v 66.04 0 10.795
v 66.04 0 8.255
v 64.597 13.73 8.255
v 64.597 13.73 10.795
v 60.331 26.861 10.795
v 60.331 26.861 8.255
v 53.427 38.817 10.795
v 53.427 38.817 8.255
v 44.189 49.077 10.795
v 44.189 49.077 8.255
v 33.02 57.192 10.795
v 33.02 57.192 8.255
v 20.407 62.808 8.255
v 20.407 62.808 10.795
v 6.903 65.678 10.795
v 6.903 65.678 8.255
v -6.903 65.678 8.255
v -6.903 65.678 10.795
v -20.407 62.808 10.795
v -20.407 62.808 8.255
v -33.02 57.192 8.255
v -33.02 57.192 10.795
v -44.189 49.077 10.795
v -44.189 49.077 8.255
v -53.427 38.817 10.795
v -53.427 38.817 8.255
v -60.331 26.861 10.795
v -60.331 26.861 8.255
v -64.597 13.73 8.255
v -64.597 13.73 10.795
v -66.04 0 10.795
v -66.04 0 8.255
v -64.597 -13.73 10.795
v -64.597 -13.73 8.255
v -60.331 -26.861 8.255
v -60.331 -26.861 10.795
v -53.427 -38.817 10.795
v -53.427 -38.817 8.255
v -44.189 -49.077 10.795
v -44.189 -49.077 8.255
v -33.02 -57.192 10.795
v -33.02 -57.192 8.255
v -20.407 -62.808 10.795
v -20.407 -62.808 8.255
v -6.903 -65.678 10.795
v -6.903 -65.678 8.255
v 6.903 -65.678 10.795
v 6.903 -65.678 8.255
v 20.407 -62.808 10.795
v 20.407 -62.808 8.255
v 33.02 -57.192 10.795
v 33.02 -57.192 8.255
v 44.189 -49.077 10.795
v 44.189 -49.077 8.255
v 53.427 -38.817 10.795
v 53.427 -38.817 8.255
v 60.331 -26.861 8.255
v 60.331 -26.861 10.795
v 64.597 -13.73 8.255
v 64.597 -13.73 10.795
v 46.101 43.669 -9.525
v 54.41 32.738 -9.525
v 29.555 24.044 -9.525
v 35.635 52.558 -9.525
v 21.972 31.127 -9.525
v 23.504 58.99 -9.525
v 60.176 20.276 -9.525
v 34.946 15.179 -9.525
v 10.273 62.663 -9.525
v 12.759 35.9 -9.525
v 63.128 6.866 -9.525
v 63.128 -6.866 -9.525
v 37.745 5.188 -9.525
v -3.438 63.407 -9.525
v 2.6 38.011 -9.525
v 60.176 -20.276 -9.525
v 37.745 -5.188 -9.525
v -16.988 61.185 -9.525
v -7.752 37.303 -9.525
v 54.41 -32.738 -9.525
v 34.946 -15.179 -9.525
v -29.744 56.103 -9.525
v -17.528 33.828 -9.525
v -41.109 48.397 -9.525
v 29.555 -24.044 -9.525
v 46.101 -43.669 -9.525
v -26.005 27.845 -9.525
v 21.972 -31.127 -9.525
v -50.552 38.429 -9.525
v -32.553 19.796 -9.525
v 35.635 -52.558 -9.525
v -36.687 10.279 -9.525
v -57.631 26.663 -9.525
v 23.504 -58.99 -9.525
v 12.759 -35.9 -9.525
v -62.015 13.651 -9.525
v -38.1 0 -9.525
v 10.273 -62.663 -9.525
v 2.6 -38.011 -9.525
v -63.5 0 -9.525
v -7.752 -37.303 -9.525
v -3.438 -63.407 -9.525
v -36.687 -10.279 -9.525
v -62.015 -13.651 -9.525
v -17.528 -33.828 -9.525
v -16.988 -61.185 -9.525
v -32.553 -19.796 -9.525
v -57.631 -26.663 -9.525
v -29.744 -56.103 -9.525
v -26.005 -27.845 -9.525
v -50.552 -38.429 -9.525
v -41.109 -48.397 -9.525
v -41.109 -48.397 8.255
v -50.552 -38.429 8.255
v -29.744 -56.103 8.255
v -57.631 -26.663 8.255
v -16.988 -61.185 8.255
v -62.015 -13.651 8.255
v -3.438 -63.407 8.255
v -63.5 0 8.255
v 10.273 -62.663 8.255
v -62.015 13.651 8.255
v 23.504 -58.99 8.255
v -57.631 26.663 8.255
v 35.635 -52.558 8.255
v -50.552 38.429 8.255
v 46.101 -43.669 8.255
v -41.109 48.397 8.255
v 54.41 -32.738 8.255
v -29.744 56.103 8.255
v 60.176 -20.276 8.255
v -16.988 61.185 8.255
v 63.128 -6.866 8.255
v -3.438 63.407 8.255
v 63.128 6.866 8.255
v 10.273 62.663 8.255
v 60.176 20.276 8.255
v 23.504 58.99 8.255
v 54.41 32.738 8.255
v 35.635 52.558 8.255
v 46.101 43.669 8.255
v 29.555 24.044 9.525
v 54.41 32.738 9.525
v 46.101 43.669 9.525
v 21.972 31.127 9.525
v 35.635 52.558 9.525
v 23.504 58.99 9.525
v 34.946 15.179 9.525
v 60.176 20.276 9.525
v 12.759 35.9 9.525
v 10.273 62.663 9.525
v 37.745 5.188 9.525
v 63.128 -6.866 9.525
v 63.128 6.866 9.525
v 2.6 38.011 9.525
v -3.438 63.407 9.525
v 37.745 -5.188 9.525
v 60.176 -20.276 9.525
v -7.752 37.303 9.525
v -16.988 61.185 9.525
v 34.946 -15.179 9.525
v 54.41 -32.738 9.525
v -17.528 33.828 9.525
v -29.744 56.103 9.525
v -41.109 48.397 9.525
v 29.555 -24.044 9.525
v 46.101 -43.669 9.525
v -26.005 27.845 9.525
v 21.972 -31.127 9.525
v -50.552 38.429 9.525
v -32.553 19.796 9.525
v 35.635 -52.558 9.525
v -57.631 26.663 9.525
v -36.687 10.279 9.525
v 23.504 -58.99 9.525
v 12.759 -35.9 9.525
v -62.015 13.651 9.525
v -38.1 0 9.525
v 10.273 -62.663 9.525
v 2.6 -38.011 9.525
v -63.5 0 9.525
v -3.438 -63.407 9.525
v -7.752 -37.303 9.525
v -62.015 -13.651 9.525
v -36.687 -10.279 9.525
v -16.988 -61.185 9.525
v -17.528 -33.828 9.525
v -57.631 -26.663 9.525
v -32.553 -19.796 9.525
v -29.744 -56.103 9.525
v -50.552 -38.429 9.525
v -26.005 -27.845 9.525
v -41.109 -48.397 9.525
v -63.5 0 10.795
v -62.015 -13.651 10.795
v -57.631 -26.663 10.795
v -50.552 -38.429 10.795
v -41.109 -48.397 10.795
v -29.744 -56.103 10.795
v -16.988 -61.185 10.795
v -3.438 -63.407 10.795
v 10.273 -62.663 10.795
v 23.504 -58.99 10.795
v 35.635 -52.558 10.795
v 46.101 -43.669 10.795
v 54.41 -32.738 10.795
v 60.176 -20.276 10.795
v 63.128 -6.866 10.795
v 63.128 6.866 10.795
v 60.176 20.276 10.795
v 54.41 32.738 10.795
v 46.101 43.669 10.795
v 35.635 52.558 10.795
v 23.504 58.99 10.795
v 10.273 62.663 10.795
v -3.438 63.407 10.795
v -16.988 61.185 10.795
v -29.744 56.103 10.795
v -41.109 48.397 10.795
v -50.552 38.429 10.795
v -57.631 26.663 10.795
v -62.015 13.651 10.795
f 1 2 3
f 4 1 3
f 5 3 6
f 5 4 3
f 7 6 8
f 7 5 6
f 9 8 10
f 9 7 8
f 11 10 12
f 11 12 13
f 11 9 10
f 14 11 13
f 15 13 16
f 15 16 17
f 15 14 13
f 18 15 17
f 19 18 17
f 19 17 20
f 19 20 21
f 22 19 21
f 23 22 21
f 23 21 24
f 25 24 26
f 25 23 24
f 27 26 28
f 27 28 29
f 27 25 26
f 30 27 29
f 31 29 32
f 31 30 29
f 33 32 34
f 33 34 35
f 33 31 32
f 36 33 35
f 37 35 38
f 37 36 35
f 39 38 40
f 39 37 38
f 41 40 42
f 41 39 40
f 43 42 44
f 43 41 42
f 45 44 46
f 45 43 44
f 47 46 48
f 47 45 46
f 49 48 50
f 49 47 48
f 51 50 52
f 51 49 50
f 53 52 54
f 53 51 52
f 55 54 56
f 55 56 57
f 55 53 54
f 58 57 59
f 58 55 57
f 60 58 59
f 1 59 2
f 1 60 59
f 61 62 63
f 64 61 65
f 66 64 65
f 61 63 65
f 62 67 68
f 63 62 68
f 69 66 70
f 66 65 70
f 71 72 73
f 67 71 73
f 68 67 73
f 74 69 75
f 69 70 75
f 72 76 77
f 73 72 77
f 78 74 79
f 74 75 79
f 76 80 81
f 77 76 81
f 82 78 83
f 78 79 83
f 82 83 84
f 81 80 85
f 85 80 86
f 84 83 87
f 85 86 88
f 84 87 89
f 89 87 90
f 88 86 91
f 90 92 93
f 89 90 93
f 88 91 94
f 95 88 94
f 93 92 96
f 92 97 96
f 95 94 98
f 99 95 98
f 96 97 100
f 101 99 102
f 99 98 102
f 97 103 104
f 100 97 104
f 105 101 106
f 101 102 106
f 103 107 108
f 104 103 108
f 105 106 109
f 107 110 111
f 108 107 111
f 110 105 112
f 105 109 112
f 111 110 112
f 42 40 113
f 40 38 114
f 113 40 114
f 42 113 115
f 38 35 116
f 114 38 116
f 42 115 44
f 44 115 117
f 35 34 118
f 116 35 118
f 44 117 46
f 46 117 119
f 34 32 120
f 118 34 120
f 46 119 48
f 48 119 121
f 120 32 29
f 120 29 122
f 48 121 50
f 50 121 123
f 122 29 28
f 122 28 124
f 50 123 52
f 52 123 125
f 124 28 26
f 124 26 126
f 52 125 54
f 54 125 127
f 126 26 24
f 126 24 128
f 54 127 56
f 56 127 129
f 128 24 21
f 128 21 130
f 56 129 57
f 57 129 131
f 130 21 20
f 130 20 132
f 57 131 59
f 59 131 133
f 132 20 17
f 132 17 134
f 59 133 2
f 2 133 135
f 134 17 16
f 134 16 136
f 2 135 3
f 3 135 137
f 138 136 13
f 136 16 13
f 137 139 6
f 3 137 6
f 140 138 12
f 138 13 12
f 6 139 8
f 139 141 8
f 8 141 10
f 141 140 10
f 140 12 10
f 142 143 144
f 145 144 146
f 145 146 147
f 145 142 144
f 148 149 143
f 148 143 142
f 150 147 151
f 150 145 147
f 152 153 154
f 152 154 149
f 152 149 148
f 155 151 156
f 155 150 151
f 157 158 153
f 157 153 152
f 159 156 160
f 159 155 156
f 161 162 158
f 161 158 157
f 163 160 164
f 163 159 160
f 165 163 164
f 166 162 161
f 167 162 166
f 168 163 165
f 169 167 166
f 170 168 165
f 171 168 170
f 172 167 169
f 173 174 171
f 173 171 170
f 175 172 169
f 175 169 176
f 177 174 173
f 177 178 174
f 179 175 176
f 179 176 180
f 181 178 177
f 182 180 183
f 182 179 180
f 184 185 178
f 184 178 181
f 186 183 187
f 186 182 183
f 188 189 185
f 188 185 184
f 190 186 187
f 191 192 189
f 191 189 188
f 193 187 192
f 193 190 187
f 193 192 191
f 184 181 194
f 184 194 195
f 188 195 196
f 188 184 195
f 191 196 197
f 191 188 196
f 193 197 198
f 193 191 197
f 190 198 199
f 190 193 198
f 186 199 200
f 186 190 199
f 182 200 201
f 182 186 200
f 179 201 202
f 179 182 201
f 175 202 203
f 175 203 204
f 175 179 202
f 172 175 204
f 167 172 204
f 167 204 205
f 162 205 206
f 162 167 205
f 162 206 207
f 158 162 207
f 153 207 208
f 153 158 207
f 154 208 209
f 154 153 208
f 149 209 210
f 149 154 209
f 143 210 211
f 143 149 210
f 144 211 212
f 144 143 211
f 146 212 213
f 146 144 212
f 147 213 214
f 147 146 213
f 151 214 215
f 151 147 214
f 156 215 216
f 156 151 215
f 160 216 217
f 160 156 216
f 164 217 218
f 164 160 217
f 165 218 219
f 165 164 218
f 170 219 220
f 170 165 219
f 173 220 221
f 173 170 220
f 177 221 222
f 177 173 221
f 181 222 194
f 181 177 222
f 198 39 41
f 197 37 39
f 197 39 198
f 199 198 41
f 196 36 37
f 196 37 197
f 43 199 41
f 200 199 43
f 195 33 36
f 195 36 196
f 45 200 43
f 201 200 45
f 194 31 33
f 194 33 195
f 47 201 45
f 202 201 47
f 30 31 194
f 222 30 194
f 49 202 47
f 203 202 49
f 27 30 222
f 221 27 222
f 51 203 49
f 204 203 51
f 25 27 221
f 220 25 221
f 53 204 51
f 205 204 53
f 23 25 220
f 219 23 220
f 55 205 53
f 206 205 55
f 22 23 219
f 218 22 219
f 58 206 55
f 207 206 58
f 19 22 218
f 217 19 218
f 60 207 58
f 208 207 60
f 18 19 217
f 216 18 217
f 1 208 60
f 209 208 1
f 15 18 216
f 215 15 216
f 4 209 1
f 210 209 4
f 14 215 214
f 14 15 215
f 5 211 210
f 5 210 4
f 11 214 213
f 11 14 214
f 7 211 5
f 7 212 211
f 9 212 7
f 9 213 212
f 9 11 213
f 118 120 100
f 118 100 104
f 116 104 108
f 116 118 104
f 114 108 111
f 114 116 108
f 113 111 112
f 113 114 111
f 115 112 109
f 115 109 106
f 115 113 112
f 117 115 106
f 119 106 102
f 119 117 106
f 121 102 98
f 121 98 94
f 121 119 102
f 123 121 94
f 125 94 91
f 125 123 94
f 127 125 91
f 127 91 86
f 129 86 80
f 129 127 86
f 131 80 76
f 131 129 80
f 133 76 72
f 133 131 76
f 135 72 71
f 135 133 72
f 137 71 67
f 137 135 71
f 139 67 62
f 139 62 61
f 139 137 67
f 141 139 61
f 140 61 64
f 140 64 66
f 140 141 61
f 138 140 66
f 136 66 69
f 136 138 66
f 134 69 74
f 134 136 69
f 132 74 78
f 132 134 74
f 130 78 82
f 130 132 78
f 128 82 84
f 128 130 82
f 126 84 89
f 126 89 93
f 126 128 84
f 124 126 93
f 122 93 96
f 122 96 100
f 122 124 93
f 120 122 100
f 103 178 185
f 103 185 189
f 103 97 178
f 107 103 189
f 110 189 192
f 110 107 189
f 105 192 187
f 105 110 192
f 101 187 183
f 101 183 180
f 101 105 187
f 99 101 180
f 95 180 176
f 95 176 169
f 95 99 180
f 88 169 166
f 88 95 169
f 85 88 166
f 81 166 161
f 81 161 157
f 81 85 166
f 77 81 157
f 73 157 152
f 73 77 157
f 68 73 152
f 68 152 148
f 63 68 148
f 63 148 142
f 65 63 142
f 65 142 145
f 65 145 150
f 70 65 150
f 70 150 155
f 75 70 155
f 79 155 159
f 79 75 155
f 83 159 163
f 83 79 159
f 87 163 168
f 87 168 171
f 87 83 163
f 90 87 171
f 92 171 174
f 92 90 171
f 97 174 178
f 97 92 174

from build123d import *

# Parameters (mm, degrees)
SKETCH1_R           = 63.5
SKETCH1_R_2         = 38.1
BOSS_EXTRUDE1_DEPTH = 9.525
SKETCH2_R           = 66.04
SKETCH2_R_2         = 63.5
BOSS_EXTRUDE2_DEPTH = 1.27


with BuildPart() as part:
    # Sketch1 → Boss-Extrude1 (new, symmetric)
    with BuildSketch(Plane.XY):
        with Locations(Location((0, 0, 0), (0, 0, 180))):
            Circle(SKETCH1_R)
        with Locations(Location((0, 0, 0), (0, 0, 180))):
            Circle(SKETCH1_R_2, mode=Mode.SUBTRACT)
    extrude(amount=BOSS_EXTRUDE1_DEPTH, both=True)

    # Sketch2 → Boss-Extrude2 (add, symmetric)
    with BuildSketch(Plane.XY.offset(9.525)):
        Circle(SKETCH2_R)
        with Locations(Location((0, 0, 0), (0, 0, 180))):
            Circle(SKETCH2_R_2, mode=Mode.SUBTRACT)
    extrude(amount=BOSS_EXTRUDE2_DEPTH, both=True)


solid = part.part
